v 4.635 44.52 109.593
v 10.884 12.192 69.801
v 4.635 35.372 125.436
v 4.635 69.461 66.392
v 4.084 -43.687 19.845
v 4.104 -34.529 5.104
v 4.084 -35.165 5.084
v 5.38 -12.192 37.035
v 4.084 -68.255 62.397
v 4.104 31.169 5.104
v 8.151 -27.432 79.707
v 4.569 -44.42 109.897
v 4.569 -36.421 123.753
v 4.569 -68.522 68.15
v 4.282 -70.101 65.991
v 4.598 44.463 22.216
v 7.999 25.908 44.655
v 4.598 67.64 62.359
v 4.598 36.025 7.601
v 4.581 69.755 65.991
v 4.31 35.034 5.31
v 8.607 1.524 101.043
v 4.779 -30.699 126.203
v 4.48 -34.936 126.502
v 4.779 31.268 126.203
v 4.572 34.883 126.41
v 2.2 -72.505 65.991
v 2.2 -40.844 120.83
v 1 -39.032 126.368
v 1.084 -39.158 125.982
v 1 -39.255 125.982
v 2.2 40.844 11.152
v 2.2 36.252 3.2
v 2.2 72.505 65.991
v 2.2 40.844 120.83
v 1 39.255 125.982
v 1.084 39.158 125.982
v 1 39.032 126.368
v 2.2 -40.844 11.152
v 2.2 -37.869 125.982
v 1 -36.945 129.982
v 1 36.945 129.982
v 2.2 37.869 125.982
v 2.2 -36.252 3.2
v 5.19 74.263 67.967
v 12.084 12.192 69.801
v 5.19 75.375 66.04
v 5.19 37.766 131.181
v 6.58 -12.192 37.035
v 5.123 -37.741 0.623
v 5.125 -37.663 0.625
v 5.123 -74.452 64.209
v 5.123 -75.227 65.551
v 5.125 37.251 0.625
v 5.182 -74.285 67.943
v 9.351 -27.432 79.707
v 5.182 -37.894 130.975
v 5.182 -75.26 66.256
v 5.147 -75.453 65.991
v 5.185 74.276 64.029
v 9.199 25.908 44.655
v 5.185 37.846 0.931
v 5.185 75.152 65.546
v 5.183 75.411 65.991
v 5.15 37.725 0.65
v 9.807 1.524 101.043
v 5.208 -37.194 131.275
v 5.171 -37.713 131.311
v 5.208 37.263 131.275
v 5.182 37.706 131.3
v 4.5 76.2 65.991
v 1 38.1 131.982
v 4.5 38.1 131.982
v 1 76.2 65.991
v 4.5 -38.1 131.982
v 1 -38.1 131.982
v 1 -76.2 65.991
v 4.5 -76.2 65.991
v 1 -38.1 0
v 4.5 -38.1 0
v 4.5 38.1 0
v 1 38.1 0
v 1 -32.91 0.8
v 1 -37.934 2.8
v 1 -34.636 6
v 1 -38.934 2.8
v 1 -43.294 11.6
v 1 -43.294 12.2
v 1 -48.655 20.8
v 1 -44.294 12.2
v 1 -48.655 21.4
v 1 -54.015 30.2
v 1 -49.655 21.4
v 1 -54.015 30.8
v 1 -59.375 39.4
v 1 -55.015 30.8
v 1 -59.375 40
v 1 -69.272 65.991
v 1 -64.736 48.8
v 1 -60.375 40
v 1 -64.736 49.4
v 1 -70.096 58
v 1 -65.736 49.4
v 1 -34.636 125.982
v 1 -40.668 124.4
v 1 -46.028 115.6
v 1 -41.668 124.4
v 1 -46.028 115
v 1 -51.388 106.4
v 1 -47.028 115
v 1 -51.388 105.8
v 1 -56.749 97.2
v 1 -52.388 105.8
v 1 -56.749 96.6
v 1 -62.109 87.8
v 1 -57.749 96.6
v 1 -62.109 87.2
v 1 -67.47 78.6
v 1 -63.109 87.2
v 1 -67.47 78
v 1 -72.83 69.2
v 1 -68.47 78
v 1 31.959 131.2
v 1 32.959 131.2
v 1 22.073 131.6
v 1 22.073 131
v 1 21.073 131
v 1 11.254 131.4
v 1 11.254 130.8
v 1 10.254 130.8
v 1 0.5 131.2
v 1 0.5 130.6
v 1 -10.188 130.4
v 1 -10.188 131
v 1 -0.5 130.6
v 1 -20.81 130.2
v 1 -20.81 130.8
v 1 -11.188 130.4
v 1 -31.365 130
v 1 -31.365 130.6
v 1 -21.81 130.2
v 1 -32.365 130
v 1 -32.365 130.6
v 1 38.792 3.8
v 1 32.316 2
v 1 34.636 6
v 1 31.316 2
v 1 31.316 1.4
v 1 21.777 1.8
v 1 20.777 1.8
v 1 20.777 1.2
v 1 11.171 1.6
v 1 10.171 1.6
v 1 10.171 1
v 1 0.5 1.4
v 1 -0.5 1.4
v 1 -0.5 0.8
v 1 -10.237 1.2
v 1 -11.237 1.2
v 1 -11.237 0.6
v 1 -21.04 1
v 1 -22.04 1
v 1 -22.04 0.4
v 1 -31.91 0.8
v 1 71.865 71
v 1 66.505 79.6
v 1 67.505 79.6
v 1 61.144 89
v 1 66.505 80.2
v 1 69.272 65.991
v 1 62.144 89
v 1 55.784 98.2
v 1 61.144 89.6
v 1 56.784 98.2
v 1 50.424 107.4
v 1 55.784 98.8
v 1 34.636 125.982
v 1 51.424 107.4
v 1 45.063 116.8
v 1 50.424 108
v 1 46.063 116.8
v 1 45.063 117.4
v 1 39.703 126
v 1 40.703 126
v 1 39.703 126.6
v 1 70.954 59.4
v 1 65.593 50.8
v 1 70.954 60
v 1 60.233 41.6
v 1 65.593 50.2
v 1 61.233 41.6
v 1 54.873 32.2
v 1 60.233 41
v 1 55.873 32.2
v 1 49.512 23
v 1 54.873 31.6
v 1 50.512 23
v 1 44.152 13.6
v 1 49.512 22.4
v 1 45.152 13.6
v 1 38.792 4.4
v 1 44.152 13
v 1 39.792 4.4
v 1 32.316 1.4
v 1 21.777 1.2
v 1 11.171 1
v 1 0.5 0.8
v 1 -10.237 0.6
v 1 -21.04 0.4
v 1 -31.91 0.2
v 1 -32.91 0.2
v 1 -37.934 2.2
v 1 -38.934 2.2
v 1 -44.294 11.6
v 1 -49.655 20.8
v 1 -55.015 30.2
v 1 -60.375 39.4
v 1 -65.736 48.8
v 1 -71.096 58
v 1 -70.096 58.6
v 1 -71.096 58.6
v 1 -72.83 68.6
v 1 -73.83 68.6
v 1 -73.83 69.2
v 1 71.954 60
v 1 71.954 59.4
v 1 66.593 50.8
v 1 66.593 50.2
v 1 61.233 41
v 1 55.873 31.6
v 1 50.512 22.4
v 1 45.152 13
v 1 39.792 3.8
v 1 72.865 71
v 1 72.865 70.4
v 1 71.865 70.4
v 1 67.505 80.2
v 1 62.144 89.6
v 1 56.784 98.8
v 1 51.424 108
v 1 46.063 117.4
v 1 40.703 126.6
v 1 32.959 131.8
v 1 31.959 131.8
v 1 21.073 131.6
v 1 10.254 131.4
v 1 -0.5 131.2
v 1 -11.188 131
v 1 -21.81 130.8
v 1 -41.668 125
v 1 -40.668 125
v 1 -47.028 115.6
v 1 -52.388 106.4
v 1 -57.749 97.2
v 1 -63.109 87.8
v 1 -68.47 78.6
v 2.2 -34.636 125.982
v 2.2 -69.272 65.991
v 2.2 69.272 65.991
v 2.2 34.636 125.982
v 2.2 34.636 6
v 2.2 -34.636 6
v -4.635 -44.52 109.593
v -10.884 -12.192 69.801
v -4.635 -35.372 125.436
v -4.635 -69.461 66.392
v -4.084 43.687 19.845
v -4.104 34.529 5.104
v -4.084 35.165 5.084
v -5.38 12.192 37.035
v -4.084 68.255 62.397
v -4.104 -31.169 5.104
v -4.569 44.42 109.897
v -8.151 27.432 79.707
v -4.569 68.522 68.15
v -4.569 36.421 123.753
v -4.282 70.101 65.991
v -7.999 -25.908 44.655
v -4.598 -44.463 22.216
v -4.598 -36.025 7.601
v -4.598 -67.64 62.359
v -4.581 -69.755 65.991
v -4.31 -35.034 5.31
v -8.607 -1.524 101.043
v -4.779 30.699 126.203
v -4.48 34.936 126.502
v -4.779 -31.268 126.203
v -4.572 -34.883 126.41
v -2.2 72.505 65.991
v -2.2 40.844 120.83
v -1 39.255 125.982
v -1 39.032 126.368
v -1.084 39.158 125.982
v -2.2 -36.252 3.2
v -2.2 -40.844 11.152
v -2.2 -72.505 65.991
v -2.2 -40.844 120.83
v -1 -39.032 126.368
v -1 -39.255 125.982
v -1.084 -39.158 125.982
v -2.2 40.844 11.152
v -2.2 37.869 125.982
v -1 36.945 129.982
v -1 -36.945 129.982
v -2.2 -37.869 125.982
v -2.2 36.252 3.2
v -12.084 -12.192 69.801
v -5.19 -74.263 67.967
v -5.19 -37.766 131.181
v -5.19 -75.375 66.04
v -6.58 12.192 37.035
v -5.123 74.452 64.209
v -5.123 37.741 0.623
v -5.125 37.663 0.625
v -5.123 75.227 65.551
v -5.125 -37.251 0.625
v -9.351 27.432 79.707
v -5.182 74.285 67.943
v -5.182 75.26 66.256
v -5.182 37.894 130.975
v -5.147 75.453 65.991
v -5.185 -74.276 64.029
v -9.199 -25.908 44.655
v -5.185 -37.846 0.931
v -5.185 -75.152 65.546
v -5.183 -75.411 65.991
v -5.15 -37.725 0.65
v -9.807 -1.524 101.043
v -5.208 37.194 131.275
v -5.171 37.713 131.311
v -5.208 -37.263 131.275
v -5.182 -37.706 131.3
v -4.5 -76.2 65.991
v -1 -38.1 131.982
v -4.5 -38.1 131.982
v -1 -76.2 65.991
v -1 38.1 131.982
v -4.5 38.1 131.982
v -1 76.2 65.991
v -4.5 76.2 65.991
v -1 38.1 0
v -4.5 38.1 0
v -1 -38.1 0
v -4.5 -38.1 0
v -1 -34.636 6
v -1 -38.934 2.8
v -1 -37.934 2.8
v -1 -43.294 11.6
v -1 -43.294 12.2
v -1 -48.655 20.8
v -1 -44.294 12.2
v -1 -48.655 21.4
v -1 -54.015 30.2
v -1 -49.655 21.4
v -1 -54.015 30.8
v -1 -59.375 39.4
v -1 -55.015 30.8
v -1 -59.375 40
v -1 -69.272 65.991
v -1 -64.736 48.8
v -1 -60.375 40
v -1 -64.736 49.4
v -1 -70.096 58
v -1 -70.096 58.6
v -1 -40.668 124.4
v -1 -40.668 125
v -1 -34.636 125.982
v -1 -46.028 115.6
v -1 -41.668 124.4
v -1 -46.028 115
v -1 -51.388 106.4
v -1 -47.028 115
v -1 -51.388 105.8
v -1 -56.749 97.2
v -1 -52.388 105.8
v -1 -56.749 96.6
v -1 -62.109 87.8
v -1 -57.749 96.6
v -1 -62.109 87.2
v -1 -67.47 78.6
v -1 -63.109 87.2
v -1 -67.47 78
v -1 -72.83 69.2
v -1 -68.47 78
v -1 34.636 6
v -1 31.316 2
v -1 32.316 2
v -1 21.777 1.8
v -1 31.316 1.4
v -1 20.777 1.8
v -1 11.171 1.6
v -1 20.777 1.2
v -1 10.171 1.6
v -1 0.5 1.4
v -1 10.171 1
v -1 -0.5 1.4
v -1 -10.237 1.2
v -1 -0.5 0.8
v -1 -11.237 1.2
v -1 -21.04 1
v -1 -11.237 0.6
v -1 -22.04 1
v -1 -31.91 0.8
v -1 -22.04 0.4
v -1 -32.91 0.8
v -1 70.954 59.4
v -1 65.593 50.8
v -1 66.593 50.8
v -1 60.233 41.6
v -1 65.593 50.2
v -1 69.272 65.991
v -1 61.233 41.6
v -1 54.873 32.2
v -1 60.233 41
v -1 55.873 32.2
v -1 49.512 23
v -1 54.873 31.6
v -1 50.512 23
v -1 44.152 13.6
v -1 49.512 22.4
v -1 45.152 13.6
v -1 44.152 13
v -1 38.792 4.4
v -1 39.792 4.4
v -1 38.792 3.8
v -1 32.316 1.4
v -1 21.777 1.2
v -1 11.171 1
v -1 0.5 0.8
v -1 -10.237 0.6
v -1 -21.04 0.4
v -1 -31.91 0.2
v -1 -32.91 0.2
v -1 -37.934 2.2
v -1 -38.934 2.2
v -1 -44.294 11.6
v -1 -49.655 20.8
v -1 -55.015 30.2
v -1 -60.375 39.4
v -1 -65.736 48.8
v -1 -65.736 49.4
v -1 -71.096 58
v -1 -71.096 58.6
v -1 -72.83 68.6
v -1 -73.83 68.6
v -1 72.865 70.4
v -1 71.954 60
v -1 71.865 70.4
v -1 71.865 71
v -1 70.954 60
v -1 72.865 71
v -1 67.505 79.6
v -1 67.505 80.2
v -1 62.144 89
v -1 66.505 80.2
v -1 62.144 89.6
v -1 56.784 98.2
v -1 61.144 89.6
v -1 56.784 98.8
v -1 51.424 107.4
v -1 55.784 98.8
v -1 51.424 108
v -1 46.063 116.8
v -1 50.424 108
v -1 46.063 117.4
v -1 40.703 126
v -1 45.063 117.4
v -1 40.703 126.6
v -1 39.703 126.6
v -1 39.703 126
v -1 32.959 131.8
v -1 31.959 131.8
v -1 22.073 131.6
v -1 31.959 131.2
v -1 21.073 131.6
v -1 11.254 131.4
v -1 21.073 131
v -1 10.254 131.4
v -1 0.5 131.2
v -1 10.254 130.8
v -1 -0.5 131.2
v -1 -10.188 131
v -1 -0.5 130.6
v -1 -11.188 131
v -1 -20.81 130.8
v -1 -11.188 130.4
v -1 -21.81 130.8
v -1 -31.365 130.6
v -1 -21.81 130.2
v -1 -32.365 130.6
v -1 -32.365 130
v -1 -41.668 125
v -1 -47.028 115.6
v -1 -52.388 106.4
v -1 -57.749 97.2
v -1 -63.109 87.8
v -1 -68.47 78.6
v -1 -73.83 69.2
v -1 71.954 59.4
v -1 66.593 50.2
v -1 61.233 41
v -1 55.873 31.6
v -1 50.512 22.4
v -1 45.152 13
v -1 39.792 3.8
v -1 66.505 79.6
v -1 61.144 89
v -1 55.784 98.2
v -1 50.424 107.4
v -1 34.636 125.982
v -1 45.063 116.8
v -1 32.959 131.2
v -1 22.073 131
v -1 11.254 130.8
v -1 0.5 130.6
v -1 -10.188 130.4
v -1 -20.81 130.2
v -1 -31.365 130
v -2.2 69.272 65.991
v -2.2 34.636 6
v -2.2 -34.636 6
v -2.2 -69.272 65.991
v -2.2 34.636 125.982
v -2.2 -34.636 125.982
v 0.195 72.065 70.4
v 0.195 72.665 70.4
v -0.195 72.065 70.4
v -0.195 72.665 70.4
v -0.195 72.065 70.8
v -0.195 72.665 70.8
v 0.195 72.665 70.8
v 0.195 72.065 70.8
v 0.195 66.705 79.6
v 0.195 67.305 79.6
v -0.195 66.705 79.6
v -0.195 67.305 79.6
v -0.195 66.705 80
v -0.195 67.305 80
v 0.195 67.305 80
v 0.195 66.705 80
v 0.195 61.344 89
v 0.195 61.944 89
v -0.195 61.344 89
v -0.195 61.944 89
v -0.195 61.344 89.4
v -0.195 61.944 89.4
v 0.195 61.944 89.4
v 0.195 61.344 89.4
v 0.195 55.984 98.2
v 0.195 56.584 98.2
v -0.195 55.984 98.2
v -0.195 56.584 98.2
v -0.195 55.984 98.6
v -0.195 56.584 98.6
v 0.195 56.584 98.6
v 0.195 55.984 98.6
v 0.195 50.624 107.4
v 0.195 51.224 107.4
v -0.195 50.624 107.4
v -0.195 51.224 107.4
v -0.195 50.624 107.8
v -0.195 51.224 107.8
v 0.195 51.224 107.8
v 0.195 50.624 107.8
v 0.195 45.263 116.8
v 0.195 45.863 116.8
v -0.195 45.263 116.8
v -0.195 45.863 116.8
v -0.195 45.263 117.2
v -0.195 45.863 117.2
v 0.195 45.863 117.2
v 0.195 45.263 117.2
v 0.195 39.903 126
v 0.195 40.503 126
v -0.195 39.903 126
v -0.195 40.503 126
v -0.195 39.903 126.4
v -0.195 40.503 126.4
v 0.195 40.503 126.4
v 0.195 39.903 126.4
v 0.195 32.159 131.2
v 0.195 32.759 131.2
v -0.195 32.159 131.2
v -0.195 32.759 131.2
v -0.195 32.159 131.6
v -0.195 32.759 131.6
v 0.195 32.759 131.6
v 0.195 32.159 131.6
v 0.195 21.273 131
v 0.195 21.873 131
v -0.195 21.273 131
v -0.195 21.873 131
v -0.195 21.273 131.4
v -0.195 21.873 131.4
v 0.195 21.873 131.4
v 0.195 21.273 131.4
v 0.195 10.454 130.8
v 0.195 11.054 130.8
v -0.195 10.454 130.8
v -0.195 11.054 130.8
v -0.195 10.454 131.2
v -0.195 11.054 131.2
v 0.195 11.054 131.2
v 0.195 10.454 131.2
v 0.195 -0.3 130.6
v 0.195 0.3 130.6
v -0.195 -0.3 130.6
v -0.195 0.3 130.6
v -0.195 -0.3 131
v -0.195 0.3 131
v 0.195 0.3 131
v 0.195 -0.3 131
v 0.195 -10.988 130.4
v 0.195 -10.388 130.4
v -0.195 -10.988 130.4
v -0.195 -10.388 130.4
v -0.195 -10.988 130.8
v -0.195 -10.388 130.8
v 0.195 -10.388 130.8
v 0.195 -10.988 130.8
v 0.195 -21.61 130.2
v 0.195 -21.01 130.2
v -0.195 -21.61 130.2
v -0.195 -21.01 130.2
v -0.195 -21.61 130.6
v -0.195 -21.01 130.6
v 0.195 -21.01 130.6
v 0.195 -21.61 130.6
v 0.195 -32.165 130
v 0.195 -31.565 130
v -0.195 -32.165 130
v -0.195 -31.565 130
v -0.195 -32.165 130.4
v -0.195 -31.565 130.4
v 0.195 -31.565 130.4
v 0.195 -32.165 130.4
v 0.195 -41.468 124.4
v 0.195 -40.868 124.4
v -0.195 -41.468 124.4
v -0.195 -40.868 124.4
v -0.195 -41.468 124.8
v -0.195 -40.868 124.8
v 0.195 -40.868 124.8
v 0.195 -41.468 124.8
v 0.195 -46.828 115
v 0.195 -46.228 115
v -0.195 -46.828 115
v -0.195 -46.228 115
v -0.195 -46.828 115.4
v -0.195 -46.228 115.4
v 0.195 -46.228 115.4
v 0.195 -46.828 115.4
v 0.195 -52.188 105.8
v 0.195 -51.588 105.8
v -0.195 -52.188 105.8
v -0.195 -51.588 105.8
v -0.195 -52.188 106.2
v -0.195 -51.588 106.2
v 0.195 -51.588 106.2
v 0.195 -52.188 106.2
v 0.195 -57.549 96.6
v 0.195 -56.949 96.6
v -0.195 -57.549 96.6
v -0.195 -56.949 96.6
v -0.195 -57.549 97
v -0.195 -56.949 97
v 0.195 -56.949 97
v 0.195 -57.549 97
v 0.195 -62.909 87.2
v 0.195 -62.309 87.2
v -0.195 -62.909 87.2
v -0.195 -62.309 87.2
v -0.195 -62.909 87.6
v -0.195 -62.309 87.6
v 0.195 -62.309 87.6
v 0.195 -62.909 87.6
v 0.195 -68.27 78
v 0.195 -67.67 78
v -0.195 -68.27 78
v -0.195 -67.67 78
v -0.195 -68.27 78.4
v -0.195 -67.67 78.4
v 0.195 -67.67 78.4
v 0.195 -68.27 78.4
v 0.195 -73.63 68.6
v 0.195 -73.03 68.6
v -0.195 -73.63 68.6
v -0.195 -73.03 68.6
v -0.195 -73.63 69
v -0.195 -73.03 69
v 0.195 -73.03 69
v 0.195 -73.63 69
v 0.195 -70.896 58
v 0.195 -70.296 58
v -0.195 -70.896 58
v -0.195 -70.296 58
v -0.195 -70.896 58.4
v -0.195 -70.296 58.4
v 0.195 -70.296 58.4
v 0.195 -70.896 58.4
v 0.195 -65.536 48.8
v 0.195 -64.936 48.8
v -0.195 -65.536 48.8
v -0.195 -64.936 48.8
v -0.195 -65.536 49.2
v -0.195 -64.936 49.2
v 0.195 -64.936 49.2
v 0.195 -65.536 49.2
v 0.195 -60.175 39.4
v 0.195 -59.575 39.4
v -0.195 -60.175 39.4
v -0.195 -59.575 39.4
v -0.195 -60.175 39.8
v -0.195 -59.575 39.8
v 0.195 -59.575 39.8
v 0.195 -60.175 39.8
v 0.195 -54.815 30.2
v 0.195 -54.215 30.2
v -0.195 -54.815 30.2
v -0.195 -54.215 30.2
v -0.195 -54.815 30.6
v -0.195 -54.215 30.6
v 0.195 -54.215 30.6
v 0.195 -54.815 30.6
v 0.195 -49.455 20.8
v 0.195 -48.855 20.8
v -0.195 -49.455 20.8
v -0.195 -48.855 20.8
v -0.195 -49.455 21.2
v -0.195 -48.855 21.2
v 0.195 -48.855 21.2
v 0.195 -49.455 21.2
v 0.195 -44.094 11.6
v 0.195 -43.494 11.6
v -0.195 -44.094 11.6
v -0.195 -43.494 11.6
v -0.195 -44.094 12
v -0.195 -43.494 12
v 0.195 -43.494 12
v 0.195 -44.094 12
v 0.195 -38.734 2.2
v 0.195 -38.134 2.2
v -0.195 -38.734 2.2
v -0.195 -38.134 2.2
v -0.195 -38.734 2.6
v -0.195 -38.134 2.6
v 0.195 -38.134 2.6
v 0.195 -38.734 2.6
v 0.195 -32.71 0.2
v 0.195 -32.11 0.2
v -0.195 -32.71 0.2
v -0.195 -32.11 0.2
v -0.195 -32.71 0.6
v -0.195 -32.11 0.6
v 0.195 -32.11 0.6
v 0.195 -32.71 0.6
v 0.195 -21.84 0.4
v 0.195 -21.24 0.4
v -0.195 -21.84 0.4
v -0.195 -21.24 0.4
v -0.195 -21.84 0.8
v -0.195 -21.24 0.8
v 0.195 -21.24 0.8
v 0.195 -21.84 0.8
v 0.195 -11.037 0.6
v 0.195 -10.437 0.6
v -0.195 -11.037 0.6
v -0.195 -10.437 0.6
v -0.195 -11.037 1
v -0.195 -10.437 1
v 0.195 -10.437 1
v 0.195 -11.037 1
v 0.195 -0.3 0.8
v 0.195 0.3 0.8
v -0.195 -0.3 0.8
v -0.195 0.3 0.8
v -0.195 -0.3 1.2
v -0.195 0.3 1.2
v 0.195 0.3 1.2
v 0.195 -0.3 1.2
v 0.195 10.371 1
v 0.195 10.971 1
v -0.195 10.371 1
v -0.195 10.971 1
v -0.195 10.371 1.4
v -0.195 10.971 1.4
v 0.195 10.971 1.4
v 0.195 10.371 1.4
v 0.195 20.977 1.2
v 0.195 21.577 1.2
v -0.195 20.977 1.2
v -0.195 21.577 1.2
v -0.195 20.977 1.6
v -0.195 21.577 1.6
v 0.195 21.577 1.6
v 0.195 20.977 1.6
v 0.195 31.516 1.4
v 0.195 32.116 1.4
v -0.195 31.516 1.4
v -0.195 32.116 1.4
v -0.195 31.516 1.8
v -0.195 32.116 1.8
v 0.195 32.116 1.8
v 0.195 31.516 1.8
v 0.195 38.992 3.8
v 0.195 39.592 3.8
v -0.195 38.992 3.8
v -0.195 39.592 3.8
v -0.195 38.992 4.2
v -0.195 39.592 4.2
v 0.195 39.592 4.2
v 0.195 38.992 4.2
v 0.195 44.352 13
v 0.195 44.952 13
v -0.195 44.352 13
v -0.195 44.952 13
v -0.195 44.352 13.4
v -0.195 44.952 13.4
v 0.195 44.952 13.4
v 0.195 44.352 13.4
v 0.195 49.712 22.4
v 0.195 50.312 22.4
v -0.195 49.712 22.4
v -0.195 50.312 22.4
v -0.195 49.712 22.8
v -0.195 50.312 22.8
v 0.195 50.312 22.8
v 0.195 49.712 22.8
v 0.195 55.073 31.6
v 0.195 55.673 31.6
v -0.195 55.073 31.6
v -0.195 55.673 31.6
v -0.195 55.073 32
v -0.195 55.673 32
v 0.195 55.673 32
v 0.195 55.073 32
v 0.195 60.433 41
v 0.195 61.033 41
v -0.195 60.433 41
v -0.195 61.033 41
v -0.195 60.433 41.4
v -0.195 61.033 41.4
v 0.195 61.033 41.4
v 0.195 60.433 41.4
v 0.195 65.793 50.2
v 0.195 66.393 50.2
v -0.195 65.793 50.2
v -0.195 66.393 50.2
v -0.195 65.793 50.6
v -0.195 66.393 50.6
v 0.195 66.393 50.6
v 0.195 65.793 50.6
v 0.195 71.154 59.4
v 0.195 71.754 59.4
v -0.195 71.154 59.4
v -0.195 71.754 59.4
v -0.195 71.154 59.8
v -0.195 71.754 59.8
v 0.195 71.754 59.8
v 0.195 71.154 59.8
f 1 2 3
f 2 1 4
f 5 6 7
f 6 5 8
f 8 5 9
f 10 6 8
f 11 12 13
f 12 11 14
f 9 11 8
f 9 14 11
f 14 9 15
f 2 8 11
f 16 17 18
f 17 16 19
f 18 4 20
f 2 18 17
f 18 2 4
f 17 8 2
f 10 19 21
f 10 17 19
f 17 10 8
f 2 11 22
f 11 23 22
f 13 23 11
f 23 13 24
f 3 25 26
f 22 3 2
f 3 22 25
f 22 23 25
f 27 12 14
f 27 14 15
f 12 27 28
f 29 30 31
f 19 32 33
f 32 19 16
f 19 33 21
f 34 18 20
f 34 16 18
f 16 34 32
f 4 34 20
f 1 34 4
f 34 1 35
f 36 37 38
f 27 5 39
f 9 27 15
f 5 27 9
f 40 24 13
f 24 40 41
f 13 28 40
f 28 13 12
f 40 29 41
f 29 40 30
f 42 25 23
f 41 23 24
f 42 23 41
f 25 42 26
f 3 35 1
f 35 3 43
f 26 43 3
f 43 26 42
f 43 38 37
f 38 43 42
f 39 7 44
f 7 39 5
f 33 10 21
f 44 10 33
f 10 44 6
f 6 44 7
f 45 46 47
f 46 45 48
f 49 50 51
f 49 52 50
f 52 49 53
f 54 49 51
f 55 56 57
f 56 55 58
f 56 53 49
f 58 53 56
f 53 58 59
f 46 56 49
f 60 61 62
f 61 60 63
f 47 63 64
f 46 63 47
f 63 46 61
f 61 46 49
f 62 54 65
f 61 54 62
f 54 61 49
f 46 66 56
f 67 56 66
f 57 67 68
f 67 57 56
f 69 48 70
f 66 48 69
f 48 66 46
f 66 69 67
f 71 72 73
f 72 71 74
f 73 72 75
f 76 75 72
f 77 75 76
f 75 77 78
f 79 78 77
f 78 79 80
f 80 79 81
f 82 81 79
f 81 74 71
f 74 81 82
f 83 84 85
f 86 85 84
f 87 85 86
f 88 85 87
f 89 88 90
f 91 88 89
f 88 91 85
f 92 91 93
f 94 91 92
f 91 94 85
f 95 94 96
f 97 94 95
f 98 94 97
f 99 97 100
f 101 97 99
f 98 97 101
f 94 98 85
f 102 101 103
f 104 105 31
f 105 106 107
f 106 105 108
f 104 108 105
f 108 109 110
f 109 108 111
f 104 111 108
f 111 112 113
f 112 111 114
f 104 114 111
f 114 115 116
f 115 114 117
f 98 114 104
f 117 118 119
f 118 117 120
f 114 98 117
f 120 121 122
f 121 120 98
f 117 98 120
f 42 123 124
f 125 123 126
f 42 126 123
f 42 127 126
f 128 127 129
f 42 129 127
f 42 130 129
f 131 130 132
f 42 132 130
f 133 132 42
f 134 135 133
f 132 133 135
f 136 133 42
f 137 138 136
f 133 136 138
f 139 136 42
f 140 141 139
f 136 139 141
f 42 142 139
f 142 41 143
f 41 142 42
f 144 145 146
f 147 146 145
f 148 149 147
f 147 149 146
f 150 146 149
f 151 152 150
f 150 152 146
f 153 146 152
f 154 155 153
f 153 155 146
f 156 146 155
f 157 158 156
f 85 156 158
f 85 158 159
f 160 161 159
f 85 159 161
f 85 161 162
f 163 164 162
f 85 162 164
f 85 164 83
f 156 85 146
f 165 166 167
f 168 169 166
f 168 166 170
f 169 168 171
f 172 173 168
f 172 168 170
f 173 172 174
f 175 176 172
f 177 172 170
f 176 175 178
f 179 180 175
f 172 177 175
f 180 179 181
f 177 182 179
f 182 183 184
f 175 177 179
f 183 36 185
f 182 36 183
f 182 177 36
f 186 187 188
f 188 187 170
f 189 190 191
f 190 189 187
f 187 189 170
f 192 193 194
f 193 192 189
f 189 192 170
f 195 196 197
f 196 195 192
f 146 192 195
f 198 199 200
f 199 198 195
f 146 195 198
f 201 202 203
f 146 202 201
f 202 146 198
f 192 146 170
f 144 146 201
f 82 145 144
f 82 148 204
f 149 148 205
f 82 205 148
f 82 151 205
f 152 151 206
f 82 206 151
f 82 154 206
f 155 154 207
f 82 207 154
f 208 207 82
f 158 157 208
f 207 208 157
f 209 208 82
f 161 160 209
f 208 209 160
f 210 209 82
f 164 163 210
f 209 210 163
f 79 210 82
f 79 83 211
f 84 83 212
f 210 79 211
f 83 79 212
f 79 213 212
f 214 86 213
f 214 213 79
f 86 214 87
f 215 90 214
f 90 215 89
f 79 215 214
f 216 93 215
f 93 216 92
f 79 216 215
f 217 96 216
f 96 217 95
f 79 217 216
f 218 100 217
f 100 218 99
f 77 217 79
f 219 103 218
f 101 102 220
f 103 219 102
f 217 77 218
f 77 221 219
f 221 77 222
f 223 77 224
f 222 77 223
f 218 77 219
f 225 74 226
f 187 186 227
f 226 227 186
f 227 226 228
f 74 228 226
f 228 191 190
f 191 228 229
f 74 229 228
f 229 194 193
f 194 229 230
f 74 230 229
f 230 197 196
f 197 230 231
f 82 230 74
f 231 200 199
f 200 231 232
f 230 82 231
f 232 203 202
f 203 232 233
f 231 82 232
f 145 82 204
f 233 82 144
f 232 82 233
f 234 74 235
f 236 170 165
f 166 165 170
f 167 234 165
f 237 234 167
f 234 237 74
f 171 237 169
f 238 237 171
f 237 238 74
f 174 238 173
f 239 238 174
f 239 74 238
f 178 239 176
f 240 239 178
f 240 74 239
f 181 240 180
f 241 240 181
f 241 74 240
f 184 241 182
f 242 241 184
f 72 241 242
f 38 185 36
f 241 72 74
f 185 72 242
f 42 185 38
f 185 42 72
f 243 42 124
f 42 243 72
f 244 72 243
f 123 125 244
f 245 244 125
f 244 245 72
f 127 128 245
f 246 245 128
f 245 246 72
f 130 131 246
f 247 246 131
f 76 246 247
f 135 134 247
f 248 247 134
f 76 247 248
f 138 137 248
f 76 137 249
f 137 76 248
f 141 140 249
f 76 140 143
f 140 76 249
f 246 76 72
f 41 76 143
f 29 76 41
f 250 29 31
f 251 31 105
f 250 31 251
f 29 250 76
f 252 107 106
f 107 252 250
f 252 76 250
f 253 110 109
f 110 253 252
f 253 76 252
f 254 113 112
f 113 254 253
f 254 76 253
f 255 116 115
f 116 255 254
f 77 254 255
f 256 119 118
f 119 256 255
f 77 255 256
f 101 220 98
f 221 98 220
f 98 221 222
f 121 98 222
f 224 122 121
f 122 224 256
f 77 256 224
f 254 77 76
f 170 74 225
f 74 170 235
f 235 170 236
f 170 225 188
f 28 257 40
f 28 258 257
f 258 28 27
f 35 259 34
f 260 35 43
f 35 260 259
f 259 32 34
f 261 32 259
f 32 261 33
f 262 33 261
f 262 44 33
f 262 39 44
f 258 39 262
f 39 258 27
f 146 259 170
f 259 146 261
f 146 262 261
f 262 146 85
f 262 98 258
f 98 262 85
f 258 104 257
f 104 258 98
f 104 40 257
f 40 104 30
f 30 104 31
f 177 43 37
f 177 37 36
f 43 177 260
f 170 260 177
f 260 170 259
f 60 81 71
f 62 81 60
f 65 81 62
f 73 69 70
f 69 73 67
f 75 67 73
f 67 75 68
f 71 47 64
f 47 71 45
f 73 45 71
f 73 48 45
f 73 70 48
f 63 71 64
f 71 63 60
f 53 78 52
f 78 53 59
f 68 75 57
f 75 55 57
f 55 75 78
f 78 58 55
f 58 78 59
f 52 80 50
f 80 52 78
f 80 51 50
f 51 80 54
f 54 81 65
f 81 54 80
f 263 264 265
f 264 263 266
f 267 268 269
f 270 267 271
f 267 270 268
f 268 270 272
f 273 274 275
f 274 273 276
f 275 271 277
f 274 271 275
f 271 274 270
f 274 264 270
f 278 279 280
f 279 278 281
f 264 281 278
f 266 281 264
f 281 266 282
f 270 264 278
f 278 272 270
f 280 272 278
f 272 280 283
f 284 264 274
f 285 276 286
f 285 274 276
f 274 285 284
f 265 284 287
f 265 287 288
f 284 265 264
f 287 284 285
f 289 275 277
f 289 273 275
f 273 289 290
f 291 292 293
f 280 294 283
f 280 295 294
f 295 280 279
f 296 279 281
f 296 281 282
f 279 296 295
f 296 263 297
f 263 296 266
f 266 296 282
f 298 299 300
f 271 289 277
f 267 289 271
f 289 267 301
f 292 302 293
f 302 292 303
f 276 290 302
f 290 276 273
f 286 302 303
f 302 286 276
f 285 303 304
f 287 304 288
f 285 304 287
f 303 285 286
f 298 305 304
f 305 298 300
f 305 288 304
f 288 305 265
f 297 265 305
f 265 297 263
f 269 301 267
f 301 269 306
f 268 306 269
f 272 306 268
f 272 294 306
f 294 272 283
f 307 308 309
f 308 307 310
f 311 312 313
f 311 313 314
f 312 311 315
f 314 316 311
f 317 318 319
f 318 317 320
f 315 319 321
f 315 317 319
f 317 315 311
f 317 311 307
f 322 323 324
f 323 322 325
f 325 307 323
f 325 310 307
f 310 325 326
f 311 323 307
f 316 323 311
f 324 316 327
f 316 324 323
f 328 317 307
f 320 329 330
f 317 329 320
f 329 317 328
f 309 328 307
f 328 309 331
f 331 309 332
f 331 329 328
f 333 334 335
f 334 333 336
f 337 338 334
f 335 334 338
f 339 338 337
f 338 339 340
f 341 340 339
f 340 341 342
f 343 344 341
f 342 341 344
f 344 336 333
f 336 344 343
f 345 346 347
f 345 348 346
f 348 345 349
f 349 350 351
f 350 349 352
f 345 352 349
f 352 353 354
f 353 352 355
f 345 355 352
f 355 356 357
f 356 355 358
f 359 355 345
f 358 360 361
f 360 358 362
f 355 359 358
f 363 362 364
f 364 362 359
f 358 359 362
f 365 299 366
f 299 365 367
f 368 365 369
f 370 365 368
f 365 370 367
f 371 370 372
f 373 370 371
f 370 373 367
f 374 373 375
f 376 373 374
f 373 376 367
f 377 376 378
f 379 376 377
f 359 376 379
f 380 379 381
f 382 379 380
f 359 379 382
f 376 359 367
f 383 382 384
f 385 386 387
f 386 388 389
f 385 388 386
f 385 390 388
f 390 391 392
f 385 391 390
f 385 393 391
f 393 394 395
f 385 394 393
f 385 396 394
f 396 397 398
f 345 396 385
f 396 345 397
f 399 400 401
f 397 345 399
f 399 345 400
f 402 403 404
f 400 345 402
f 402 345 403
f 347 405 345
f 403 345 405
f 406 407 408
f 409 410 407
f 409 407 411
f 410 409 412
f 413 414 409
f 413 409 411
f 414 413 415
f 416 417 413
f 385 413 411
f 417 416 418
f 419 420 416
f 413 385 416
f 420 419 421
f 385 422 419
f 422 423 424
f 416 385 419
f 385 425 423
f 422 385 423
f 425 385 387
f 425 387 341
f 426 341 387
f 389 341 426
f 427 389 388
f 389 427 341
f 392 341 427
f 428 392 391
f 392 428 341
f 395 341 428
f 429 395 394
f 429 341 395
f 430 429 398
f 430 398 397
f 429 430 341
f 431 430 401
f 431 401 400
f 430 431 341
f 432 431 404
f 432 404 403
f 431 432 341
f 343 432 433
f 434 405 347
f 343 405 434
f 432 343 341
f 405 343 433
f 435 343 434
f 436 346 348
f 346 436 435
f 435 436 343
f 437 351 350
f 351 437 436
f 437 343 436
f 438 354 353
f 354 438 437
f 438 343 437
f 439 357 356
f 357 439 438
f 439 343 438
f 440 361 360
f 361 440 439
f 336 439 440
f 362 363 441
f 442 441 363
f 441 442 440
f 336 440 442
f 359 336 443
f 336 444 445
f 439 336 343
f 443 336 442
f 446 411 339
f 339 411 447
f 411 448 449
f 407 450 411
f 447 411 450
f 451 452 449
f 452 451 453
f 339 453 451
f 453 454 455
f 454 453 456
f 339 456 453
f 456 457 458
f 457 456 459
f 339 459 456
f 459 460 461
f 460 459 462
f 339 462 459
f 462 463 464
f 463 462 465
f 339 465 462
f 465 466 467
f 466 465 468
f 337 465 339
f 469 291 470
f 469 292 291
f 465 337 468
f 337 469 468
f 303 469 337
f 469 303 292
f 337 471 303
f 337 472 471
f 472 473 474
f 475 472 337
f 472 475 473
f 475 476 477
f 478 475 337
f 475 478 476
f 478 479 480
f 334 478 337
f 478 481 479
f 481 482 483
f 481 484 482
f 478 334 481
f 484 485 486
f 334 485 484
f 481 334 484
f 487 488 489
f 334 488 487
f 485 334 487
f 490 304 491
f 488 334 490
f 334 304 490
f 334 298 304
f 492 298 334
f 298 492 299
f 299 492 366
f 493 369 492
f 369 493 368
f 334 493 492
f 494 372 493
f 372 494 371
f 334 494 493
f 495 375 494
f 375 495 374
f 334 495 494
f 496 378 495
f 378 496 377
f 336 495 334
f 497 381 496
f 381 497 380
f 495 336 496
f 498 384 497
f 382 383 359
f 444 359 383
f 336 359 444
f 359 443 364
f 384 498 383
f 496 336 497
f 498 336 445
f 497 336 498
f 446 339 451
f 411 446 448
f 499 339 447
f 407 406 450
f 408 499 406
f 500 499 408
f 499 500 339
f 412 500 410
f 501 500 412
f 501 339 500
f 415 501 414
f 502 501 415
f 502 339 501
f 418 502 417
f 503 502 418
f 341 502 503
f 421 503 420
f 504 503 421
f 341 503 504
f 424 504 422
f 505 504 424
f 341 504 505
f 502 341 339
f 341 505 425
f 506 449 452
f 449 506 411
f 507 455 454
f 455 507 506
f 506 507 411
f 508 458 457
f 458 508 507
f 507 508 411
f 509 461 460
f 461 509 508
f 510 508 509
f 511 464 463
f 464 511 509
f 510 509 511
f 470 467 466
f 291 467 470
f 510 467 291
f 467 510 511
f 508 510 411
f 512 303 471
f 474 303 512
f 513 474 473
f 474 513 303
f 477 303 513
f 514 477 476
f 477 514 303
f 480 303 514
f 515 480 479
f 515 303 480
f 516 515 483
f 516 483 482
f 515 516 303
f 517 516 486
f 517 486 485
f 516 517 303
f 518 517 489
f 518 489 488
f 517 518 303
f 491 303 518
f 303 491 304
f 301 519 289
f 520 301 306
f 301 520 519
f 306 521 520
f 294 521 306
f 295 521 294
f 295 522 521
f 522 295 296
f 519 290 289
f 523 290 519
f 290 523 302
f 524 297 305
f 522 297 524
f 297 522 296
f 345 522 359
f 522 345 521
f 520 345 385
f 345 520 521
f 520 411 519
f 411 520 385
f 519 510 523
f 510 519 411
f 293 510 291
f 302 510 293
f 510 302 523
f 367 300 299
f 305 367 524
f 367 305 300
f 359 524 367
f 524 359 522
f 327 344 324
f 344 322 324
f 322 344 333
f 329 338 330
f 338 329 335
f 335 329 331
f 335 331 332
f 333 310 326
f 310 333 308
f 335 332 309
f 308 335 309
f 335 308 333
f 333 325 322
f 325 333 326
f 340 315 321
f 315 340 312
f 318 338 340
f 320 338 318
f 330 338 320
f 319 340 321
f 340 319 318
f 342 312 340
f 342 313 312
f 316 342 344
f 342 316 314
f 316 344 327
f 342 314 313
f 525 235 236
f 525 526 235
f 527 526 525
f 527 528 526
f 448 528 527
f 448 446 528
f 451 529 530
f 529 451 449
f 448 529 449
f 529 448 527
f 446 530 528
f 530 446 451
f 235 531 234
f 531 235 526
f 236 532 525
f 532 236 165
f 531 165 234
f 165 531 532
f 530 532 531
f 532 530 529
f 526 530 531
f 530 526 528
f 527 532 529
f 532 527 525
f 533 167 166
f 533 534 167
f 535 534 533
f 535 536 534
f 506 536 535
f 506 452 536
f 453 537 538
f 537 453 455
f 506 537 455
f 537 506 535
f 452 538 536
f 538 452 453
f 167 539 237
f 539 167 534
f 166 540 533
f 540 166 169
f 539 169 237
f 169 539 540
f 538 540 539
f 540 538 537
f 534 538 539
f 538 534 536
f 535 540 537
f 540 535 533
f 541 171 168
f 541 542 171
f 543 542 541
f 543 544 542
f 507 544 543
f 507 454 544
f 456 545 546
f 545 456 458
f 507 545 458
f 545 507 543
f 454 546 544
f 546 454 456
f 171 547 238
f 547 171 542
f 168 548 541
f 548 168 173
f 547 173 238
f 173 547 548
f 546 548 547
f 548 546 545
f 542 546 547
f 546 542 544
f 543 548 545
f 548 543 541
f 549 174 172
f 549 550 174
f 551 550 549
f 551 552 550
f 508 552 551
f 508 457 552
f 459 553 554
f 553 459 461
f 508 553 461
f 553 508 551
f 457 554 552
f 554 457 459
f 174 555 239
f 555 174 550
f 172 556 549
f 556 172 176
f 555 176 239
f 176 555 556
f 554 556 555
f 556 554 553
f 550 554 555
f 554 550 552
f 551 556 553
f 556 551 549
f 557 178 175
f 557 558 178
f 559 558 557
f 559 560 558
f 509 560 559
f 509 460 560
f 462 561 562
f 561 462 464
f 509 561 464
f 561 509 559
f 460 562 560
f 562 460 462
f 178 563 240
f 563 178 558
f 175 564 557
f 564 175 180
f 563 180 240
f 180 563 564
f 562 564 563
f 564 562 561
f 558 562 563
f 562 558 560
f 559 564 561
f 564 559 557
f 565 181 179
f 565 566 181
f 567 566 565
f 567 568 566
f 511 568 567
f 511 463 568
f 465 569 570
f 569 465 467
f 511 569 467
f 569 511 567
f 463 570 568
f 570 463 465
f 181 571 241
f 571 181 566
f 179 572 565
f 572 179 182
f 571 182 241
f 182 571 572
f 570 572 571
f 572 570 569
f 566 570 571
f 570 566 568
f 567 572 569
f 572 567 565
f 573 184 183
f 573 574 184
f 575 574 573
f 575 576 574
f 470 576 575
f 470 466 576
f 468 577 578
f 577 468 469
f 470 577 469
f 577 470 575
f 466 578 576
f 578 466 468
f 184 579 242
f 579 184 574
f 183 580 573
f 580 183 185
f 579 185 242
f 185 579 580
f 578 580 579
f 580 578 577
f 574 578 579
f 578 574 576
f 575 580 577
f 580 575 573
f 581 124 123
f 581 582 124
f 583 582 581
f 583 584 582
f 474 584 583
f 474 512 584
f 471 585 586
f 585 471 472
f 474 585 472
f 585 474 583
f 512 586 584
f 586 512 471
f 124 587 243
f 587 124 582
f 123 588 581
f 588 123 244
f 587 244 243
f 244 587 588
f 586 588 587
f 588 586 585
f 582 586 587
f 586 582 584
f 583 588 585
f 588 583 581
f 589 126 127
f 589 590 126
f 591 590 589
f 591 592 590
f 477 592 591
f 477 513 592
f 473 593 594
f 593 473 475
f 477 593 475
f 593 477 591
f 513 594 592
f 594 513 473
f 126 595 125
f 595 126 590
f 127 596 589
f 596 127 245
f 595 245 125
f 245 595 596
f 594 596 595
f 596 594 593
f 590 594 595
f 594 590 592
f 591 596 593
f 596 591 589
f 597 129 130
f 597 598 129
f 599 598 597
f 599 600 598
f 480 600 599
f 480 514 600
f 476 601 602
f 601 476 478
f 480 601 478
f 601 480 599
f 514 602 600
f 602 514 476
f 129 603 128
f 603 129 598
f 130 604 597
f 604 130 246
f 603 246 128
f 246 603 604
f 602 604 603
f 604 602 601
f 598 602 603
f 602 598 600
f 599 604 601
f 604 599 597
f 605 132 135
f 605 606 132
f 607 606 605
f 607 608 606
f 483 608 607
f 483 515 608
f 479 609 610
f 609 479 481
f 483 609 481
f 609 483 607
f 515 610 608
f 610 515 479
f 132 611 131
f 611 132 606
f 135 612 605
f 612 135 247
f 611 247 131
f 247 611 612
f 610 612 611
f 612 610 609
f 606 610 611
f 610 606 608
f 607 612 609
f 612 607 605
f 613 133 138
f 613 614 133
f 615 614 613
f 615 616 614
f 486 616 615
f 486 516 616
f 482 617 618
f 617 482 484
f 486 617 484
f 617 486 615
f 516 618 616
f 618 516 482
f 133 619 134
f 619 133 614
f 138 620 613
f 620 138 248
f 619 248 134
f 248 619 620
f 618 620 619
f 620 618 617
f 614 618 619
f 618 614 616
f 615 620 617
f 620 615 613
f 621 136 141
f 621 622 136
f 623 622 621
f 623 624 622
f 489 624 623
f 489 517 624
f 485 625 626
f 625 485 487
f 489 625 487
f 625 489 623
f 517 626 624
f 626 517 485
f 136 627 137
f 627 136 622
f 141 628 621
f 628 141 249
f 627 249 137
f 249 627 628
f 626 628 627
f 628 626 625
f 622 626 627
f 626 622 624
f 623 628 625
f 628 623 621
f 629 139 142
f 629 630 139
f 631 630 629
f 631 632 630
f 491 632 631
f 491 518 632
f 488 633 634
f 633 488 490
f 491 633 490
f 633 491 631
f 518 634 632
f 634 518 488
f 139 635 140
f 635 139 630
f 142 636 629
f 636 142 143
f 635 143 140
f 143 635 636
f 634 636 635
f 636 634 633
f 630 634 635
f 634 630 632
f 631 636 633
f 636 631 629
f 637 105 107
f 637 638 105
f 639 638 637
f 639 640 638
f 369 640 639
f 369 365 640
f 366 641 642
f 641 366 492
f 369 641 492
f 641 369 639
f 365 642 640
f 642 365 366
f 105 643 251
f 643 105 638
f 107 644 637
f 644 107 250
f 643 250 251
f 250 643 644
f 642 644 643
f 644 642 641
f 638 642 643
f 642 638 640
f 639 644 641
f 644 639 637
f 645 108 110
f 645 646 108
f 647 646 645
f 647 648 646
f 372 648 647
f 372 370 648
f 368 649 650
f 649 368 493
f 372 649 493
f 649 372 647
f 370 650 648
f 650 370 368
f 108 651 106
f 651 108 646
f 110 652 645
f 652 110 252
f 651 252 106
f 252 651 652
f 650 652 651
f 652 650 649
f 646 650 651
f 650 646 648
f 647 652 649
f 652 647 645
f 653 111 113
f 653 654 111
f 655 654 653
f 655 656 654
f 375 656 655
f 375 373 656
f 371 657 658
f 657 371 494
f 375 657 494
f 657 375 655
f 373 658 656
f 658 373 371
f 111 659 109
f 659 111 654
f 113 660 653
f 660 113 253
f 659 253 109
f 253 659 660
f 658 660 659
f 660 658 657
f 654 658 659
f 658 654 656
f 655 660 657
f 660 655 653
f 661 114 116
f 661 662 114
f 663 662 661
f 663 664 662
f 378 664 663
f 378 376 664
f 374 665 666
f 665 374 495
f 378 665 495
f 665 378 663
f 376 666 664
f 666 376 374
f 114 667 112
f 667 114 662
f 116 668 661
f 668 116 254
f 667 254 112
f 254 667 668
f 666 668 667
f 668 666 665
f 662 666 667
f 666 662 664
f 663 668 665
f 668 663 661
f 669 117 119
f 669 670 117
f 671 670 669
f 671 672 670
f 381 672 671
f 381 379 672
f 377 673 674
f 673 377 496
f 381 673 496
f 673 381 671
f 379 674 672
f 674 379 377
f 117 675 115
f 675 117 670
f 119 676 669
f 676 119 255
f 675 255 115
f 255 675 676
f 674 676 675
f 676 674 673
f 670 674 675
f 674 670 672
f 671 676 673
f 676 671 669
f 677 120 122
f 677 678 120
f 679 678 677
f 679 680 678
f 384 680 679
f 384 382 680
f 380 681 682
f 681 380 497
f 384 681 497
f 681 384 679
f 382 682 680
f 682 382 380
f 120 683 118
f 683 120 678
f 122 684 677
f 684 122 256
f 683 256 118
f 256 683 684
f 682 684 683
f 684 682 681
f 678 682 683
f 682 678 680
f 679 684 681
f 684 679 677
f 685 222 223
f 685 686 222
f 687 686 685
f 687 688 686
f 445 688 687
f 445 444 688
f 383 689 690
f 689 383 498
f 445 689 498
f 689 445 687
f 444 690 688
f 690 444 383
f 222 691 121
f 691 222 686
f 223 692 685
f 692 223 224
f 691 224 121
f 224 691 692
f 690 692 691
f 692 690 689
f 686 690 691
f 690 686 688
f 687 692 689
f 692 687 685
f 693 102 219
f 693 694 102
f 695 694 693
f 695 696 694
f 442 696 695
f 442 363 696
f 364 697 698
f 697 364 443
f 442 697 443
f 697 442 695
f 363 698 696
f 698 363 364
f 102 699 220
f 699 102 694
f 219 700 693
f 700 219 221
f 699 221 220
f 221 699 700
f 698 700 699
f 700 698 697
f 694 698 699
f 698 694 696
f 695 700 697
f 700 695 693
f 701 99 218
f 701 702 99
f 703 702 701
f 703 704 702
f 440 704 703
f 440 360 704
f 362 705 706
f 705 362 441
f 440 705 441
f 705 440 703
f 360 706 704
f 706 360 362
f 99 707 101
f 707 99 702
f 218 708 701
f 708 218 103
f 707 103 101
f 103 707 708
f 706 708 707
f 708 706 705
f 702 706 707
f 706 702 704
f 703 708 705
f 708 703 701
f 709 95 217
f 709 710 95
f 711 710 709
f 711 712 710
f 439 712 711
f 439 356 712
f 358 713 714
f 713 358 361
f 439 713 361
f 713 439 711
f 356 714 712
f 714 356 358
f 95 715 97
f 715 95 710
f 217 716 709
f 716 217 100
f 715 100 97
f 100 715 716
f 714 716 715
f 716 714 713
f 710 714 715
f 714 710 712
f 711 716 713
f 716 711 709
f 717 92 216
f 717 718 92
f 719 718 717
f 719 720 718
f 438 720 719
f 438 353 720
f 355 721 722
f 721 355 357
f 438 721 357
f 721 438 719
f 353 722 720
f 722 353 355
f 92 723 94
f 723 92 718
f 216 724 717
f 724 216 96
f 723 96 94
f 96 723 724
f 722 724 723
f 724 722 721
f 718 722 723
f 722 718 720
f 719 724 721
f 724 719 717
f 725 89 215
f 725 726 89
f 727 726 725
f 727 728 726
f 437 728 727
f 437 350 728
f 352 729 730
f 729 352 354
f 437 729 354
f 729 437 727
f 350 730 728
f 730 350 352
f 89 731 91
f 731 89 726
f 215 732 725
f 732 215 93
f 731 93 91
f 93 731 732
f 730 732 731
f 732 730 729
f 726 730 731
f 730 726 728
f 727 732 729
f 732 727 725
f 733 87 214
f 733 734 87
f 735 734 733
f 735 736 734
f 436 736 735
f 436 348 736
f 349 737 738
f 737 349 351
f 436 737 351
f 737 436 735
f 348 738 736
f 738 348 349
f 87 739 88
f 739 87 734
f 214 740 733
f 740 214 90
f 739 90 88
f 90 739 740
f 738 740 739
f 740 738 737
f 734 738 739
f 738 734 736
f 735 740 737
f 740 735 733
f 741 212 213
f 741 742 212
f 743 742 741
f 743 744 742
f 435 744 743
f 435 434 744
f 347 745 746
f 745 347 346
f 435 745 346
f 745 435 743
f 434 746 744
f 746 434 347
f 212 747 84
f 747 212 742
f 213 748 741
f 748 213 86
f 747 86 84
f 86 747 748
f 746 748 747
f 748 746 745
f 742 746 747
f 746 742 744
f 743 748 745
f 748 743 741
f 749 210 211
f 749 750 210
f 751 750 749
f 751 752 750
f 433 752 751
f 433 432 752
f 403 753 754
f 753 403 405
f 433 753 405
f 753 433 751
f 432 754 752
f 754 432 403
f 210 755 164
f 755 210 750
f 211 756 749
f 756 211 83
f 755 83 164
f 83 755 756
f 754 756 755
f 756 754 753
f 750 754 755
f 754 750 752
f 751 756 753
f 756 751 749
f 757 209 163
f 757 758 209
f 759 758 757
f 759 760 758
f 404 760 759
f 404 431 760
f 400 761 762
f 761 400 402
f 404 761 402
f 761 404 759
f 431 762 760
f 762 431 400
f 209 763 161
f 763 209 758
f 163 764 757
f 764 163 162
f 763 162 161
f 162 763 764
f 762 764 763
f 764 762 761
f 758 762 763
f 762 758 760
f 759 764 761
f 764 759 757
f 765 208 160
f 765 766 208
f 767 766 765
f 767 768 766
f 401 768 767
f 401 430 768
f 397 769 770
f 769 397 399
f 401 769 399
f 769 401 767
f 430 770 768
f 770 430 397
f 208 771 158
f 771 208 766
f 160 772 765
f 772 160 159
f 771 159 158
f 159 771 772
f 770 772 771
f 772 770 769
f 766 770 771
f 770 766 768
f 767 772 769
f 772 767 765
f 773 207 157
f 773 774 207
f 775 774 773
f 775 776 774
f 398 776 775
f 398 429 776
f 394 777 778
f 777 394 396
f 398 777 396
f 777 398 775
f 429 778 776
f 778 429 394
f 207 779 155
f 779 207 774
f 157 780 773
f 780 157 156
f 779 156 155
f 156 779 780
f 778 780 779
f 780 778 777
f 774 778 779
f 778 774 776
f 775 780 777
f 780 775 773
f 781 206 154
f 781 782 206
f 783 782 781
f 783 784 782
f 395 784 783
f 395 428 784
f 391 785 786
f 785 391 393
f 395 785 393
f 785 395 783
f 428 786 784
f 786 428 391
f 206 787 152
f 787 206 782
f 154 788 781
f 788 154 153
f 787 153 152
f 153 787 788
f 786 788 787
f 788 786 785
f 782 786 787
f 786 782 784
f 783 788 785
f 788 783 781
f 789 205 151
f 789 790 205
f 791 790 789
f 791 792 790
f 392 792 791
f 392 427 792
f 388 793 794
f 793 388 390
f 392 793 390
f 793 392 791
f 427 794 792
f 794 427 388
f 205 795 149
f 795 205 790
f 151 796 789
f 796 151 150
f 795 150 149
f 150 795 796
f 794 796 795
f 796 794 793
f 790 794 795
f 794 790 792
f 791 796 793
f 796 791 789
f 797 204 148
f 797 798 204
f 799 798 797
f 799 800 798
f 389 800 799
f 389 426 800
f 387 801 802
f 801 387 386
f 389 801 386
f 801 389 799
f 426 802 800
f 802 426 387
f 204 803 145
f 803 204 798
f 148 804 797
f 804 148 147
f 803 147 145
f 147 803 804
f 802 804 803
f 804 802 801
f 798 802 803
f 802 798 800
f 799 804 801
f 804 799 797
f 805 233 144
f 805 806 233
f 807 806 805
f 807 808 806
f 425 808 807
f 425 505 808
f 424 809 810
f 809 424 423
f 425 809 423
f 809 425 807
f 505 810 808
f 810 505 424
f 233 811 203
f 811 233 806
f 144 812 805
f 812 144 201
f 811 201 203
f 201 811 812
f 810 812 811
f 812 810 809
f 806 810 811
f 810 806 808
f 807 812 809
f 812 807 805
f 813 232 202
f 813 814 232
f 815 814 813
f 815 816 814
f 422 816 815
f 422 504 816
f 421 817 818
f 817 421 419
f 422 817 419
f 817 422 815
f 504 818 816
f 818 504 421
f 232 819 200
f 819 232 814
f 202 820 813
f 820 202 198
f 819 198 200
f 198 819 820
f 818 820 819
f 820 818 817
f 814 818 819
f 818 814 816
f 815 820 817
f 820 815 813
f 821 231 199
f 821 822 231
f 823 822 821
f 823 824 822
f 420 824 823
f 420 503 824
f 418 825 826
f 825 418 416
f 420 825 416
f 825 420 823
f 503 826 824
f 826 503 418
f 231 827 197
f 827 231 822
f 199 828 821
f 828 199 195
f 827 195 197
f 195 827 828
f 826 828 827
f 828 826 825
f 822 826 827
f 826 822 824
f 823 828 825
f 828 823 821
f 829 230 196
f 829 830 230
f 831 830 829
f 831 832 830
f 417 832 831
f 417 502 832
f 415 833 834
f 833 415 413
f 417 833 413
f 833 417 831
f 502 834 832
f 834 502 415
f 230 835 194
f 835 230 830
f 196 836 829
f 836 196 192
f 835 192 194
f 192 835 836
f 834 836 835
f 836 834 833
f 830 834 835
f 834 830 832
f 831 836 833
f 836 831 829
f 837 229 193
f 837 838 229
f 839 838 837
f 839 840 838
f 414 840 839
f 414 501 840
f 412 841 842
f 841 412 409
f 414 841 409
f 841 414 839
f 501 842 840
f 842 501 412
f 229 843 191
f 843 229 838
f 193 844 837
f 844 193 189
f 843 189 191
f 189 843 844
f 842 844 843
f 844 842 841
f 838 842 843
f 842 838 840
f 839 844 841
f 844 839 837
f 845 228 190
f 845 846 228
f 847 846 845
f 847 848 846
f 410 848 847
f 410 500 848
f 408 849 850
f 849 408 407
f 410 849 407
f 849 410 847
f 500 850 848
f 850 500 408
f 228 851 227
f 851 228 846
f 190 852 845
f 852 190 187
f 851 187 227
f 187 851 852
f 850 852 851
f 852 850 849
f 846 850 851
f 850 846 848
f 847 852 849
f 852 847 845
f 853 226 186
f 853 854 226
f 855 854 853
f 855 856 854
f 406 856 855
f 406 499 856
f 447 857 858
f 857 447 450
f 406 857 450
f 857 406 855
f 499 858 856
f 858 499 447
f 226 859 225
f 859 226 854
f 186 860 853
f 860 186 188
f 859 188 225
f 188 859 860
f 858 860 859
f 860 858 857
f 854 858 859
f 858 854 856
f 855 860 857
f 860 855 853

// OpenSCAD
/* HEX TILE v70 — reviewed native parametric OpenSCAD; millimetres.
   Standalone: no imports, missing modules, embedded STL or fused base rail.
   Default is ONE candidate pair. 'chain' lays out independent pairs.
   F5 = preview. F6 = render; then File > Export > STL.
   Cut center necks before separating. Do not twist, peel or pry tile faces.
   Geometry checks cannot certify clean release, finish or print stability.
   OpenSCAD 2026.10.11 + Manifold tested; slicer remains authoritative.
*/

/* [Output] */
output = "pair"; // [pair, chain, wall, flat, separated, tabs, section, release_test]
inspection_spacing = 18;
show_markers = false; // Preview only; excluded from exported geometry.

/* [Tile geometry] */
size_in = 6;
edge_depth = 4.1;
rim = 2.0;
skin = 1.2; // Vertical offset of faceted surface; not normal wall thickness.
relief_scale = 1.0;
front_chamfer = 0.6;
back_edge_chamfer = 0; // Maximize flat mounting surface; optional small bevel.

/* [Open back and tape flange] */
back_ring_width = 6;
back_ring_t = 1.2;
include_top_flange = false; // Omit broad horizontal top tape band for upright mode.
minimum_front_clearance = 1.2;

/* [Cuttable connections] */
pair_gap = 2.0;
root_width = 1.0;
root_height = 0.6;
root_overlap = 0.30; // Embed into flange, not a prediction of residual stub height.
neck_width = 0.60;
neck_height = 0.40;
neck_length = 0.40;
tab_pitch = 12;

/* [Layer checks — match slicer] */
layer_height = 0.20;
first_layer_height = 0.20;
line_width = 0.42; // Check only; SCAD cannot set slicer extrusion width/nozzle.
enforce_event_limits = true;
root_event_limit = 2;
all_event_limit = 3;

/* [Batch and bed — conservative rectangular check] */
chain_count = 3;
chain_gap = 6;
bed_width = 256;
bed_depth = 256;
bed_height = 256;
planned_brim = 10; // Used only in fit check; set brim separately in the slicer.
bed_margin = 5;

/* [Release sample — real lower rim, flange and front skin] */
sample_width = 24;
sample_height = 18;
sample_spacing = 10;

/* [Hidden] */
eps = 0.01;
R = size_in*25.4/2;
AP = R*cos(30);
relief_max = 0.091654*R*relief_scale;
front_max = edge_depth+relief_max;
D = front_max+1;
pair_width = 2*front_max+pair_gap;
N = max(2,ceil(R/tab_pitch));
lo = root_height/2+0.10;
hi = rim-root_height/2;
phase = [0,0,0.18,0.33,0,-0.17];
joined_mode = output=="pair" || output=="chain" || output=="section";
uses_tabs = joined_mode || output=="tabs";
integer_tolerance = 0.0001;

function dot2(a,b) = a[0]*b[0]+a[1]*b[1];
function lerp(a,b,t) = a+(b-a)*t;
function integer_value(x) = abs(x-round(x))<integer_tolerance;
function hex_point(s,inset) = let(rr=(AP-inset)/cos(30))
    [rr*cos(60*s),rr*sin(60*s)];
function inset_at(s,i) = s==1 ? lerp(lo,hi-0.1,i/(N-1)) :
    s==4 ? lerp(lo+0.1,hi,i/(N-1)) : rim/2;
function raw_center(s,i) = let(ins=inset_at(s,i),t=(i+0.5+phase[s])/N)
    lerp(hex_point(s,ins),hex_point(s+1,ins),t);
// Root bottom snaps to a BED-ALIGNED layer boundary, with no change to its width coordinate.
function bed_layer_index(z) = floor((z-first_layer_height)/layer_height+0.5);
function layer_boundary(k) = first_layer_height+k*layer_height;
function tab_center(s,i) = let(p=raw_center(s,i),
    k=bed_layer_index(p[1]+AP-root_height/2))
    [p[0],layer_boundary(k)+root_height/2-AP];
centers = [for(s=[0:5],i=[0:N-1]) tab_center(s,i)];
function root_bottom_layer(p) = bed_layer_index(p[1]+AP-root_height/2);
root_layers = round(root_height/layer_height);
neck_layers = round(neck_height/layer_height);
root_events = [for(p=centers,d=[0,root_layers]) root_bottom_layer(p)+d];
// Count each distinct transition once per join (root start, neck end, root end).
all_events = neck_layers==root_layers ? root_events :
    [for(p=centers,d=[0,neck_layers,root_layers]) root_bottom_layer(p)+d];
function event_peak(events) = max([for(k=events) len([for(e=events) if(e==k) 1])]);
root_peak = event_peak(root_events);
all_peak = event_peak(all_events);
actual_pitch = max([for(s=[0:5],i=[0:N-2])
    norm(tab_center(s,i+1)-tab_center(s,i))]);
function rim_distance(p) = AP-max([for(s=[0:5]) dot2(p,[cos(30+60*s),sin(30+60*s)])]);
root_corners = [for(p=centers,dy=[-1,1],dz=[-1,1])
    p+[dy*root_width/2,dz*root_height/2]];
root_outer_margin = min([for(p=root_corners) rim_distance(p)]);
root_inner_distance = max([for(p=root_corners) rim_distance(p)]);

assert(size_in>=3 && size_in<=10,"Size must be 3–10 inches");
assert(edge_depth>0 && skin>0 && relief_scale>0,"Invalid body dimensions");
assert(rim>=1.5 && rim<AP/4,"Rim outside supported range");
assert(back_ring_t>0 && back_ring_width>=0 && back_ring_width<=AP/2,"Invalid flange");
assert(edge_depth-skin-back_ring_t>=minimum_front_clearance,"Flange too close to front skin");
assert(minimum_front_clearance>0,"Front clearance must be positive");
assert(front_chamfer>=0 && front_chamfer<min(rim,edge_depth),"Invalid front chamfer");
assert(back_edge_chamfer>=0 && back_edge_chamfer<min(rim,back_ring_t),"Invalid back bevel");
assert(layer_height>0 && first_layer_height>0 && line_width>0,"Invalid slicer check values");
assert(pair_gap>=1.5 && pair_gap<=3,"Pair gap must be 1.5–3 mm");
assert(root_height>0 && root_height<=1 && root_width>neck_width && root_width<=1.2,"Invalid root");
assert(neck_width>=line_width && neck_height>=layer_height && neck_height<=root_height,"Unprintable neck dimensions");
assert(neck_length>0 && neck_length<pair_gap,"Neck must fit in gap");
assert(root_overlap>0 && root_overlap<back_ring_t,"Root overlap must fit flange thickness");
assert(integer_value(root_height/layer_height) && integer_value(neck_height/layer_height),"Root/neck heights must be whole layers");
assert(tab_pitch>0 && hi>lo+0.1,"Invalid tab spacing or rim allowance");
assert(!uses_tabs || actual_pitch<=tab_pitch,"Actual tab spacing exceeds requested pitch");
assert(!uses_tabs || (root_outer_margin>eps && root_inner_distance<=rim+eps),"A root extends outside the supported rim; revise dimensions");
assert(!joined_mode || back_ring_width>=rim,"Joined outputs require a supporting tape flange");
assert(!uses_tabs || !enforce_event_limits || (root_peak<=root_event_limit && all_peak<=all_event_limit),"Layer transition burst: adjust layout or deliberately revise limits");
assert(integer_value(chain_count) && chain_count>=1 && chain_count<=8,"Batch count must be integer 1–8");
assert(chain_gap>0 && inspection_spacing>=0,"Invalid spacing");
assert(output!="release_test" || (sample_width>=root_width+4 && sample_width<R && sample_height>8 && sample_height<AP/2),"Invalid sample dimensions");
assert(back_ring_width>=4 || output!="release_test","Sample needs at least 4 mm tape flange");
assert(planned_brim>=0 && bed_margin>=0 && min(bed_width,bed_depth,bed_height)>0,"Invalid bed check");
assert(output=="pair" || output=="chain" || output=="wall" || output=="flat" ||
    output=="separated" || output=="tabs" || output=="section" || output=="release_test","Unknown output");

// Bounds include intended brim and margin; they do not model printer exclusion zones.
layout_x = output=="chain" ? chain_count*pair_width+(chain_count-1)*chain_gap :
    output=="release_test" ? 3*pair_width+2*sample_spacing :
    output=="flat" ? 2*R : output=="wall" ? front_max :
    output=="separated" ? pair_width+inspection_spacing : pair_width;
layout_y = output=="release_test" ? sample_width : output=="flat" ? 2*AP : 2*R;
layout_z = output=="release_test" ? sample_height : output=="flat" ? front_max : 2*AP;
print_layout = output=="pair" || output=="chain" || output=="wall" || output=="flat" || output=="release_test";
assert(!print_layout || (layout_x+2*(planned_brim+bed_margin)<=bed_width &&
    layout_y+2*(planned_brim+bed_margin)<=bed_depth && layout_z<=bed_height),"Layout plus brim/margin exceeds bed; resize or reduce batch count");

echo(str("v70 | ",output," | ",6*N," joins/pair | max actual pitch ",actual_pitch," mm"));
echo(str("BED-ALIGNED transitions/pair: root=",root_peak,"; including neck=",all_peak));
if(output=="chain") echo(str("Whole-batch transition counts scale by ",chain_count,"; independent pairs, NO fused rail"));
if(output=="flat") echo("Flat mode is inspection/export only until support/bridging behavior is validated.");
if(include_top_flange) echo("Full top flange enabled: inspect unsupported starts in the actual slice.");

// Inherited v30/v57 low-poly facet topology; normalized coordinates.
FP = [[1,0,0],[0.5,0.866025,0],[-0.5,0.866025,0],[-1,0,0],[-0.5,-0.866025,0],[0.5,-0.866025,0],
      [0.16,0.05,0.091654],[-0.16,-0.38,0.019428],[-0.36,0.18,0.05579],[0.34,-0.28,0.053795],[0.02,0.46,0.061766]];
FACES = [[0,6,1],[4,3,7],[5,4,7],[8,3,2],[7,3,8],[7,8,6],[5,9,0],[9,6,0],[9,7,6],[5,7,9],
         [6,8,10],[8,2,10],[6,10,1],[10,2,1],[1,12,11,0],[2,13,12,1],[3,14,13,2],
         [4,15,14,3],[5,16,15,4],[0,11,16,5],[11,12,13,14,15,16]];
module hex2d(a) { circle(r=a/cos(30),$fn=6); }
module faceted_solid(dz=0,zb=0) {
    polyhedron(points=concat(
        [for(p=FP) [p[0]*R,p[1]*R,edge_depth+p[2]*R*relief_scale+dz]],
        [for(i=[0:5]) [FP[i][0]*R,FP[i][1]*R,zb]]),faces=FACES,convexity=12);
}
module cavity() {
    H=D+2; a=AP-rim+1;
    assert(a>H,"Size too small for requested cavity depth");
    intersection() {
        faceted_solid(-skin,-1);
        translate([0,0,-1]) linear_extrude(H,scale=(a-H)/a) hex2d(a);
    }
}
module front_envelope() {
    H=D+5;
    union() {
        translate([0,0,-eps]) linear_extrude(edge_depth-front_chamfer+eps) hex2d(AP+eps);
        translate([0,0,edge_depth-front_chamfer]) linear_extrude(H,scale=(AP-H)/AP) hex2d(AP);
    }
}
// Intersection envelope keeps the interior; unlike v68 it does not subtract the center.
module back_envelope() {
    union() {
        linear_extrude(back_edge_chamfer,scale=AP/(AP-back_edge_chamfer)) hex2d(AP-back_edge_chamfer);
        translate([0,0,back_edge_chamfer]) linear_extrude(D+1) hex2d(AP);
    }
}
module tape_flange() {
    if(back_ring_width>0) linear_extrude(back_ring_t)
        intersection() {
            difference() { hex2d(AP); hex2d(AP-back_ring_width); }
            if(!include_top_flange)
                translate([-2*R,-2*AP]) square([4*R,3*AP-back_ring_width]);
        }
}
module tile() {
    intersection() {
        union() { difference() { faceted_solid(); cavity(); } tape_flange(); }
        if(front_chamfer>0) front_envelope(); else faceted_solid();
        if(back_edge_chamfer>0) back_envelope(); else faceted_solid();
    }
}
// Canonical frame: X=depth, Y=tile width, Z=height. Back plane at X=0.
module oriented_tile() {
    multmatrix([[0,0,1,0],[1,0,0,0],[0,1,0,0],[0,0,0,1]]) tile();
}
module first_tile() { translate([pair_gap/2,0,0]) oriented_tile(); }
module partner_tile() { rotate([0,0,180]) first_tile(); }
module bodies() { first_tile(); partner_tile(); }
module connection(h=neck_height) {
    assert(h>0 && h<=root_height+integer_tolerance && integer_value(h/layer_height),"Sample neck must fit the root in whole layers");
    // All pieces share a bottom plane. Neck shoulders taper toward a cuttable center.
    bottom=-root_height/2;
    for(sign=[-1,1]) hull() {
        translate([sign*(pair_gap/2+root_overlap/2),0,bottom+root_height/2])
            cube([root_overlap,root_width,root_height],center=true);
        translate([sign*neck_length/2,0,bottom+h/2]) cube([eps,neck_width,h],center=true);
    }
    translate([0,0,bottom+h/2]) cube([neck_length+eps,neck_width,h],center=true);
}
module tabs() { for(p=centers) translate([0,p[0],p[1]]) connection(); }
module pair_model() { union() { bodies(); tabs(); } }
module chain_model() {
    for(i=[0:chain_count-1]) translate([(i-(chain_count-1)/2)*(pair_width+chain_gap),0,0]) pair_model();
}
module separated_model() {
    color("#e9a480") translate([inspection_spacing/2,0,0]) first_tile();
    color("#7fa7b6") translate([-inspection_spacing/2,0,0]) partner_tile();
}
module upright() { translate([0,0,AP]) children(); }
module release_sample(h) {
    // Actual lower rim, flange, cavity and visible skin; one join at a layer-aligned height.
    sample_join_z=first_layer_height+round(2/layer_height)*layer_height;
    union() {
        intersection() {
            upright() bodies();
            translate([-pair_width/2-eps,-sample_width/2,0]) cube([pair_width+2*eps,sample_width,sample_height]);
        }
        translate([0,0,sample_join_z+root_height/2]) connection(h);
    }
}
module release_test_plate() {
    for(i=[0:2]) translate([(i-1)*(pair_width+sample_spacing),0,0])
        release_sample((i+1)*layer_height);
}
if(output=="flat") tile();
else if(output=="release_test") release_test_plate();
else upright() {
    if(output=="pair") pair_model();
    else if(output=="chain") chain_model();
    else if(output=="wall") oriented_tile();
    else if(output=="separated") separated_model();
    else if(output=="tabs") tabs();
    else if(output=="section") intersection() {
        pair_model(); translate([-pair_width,-0.5,-2*AP]) cube([2*pair_width,1,4*AP]);
    }
    if($preview && show_markers && output!="wall")
        for(p=centers) %color("red") translate([0,p[0],p[1]]) sphere(r=1,$fn=16);
}
